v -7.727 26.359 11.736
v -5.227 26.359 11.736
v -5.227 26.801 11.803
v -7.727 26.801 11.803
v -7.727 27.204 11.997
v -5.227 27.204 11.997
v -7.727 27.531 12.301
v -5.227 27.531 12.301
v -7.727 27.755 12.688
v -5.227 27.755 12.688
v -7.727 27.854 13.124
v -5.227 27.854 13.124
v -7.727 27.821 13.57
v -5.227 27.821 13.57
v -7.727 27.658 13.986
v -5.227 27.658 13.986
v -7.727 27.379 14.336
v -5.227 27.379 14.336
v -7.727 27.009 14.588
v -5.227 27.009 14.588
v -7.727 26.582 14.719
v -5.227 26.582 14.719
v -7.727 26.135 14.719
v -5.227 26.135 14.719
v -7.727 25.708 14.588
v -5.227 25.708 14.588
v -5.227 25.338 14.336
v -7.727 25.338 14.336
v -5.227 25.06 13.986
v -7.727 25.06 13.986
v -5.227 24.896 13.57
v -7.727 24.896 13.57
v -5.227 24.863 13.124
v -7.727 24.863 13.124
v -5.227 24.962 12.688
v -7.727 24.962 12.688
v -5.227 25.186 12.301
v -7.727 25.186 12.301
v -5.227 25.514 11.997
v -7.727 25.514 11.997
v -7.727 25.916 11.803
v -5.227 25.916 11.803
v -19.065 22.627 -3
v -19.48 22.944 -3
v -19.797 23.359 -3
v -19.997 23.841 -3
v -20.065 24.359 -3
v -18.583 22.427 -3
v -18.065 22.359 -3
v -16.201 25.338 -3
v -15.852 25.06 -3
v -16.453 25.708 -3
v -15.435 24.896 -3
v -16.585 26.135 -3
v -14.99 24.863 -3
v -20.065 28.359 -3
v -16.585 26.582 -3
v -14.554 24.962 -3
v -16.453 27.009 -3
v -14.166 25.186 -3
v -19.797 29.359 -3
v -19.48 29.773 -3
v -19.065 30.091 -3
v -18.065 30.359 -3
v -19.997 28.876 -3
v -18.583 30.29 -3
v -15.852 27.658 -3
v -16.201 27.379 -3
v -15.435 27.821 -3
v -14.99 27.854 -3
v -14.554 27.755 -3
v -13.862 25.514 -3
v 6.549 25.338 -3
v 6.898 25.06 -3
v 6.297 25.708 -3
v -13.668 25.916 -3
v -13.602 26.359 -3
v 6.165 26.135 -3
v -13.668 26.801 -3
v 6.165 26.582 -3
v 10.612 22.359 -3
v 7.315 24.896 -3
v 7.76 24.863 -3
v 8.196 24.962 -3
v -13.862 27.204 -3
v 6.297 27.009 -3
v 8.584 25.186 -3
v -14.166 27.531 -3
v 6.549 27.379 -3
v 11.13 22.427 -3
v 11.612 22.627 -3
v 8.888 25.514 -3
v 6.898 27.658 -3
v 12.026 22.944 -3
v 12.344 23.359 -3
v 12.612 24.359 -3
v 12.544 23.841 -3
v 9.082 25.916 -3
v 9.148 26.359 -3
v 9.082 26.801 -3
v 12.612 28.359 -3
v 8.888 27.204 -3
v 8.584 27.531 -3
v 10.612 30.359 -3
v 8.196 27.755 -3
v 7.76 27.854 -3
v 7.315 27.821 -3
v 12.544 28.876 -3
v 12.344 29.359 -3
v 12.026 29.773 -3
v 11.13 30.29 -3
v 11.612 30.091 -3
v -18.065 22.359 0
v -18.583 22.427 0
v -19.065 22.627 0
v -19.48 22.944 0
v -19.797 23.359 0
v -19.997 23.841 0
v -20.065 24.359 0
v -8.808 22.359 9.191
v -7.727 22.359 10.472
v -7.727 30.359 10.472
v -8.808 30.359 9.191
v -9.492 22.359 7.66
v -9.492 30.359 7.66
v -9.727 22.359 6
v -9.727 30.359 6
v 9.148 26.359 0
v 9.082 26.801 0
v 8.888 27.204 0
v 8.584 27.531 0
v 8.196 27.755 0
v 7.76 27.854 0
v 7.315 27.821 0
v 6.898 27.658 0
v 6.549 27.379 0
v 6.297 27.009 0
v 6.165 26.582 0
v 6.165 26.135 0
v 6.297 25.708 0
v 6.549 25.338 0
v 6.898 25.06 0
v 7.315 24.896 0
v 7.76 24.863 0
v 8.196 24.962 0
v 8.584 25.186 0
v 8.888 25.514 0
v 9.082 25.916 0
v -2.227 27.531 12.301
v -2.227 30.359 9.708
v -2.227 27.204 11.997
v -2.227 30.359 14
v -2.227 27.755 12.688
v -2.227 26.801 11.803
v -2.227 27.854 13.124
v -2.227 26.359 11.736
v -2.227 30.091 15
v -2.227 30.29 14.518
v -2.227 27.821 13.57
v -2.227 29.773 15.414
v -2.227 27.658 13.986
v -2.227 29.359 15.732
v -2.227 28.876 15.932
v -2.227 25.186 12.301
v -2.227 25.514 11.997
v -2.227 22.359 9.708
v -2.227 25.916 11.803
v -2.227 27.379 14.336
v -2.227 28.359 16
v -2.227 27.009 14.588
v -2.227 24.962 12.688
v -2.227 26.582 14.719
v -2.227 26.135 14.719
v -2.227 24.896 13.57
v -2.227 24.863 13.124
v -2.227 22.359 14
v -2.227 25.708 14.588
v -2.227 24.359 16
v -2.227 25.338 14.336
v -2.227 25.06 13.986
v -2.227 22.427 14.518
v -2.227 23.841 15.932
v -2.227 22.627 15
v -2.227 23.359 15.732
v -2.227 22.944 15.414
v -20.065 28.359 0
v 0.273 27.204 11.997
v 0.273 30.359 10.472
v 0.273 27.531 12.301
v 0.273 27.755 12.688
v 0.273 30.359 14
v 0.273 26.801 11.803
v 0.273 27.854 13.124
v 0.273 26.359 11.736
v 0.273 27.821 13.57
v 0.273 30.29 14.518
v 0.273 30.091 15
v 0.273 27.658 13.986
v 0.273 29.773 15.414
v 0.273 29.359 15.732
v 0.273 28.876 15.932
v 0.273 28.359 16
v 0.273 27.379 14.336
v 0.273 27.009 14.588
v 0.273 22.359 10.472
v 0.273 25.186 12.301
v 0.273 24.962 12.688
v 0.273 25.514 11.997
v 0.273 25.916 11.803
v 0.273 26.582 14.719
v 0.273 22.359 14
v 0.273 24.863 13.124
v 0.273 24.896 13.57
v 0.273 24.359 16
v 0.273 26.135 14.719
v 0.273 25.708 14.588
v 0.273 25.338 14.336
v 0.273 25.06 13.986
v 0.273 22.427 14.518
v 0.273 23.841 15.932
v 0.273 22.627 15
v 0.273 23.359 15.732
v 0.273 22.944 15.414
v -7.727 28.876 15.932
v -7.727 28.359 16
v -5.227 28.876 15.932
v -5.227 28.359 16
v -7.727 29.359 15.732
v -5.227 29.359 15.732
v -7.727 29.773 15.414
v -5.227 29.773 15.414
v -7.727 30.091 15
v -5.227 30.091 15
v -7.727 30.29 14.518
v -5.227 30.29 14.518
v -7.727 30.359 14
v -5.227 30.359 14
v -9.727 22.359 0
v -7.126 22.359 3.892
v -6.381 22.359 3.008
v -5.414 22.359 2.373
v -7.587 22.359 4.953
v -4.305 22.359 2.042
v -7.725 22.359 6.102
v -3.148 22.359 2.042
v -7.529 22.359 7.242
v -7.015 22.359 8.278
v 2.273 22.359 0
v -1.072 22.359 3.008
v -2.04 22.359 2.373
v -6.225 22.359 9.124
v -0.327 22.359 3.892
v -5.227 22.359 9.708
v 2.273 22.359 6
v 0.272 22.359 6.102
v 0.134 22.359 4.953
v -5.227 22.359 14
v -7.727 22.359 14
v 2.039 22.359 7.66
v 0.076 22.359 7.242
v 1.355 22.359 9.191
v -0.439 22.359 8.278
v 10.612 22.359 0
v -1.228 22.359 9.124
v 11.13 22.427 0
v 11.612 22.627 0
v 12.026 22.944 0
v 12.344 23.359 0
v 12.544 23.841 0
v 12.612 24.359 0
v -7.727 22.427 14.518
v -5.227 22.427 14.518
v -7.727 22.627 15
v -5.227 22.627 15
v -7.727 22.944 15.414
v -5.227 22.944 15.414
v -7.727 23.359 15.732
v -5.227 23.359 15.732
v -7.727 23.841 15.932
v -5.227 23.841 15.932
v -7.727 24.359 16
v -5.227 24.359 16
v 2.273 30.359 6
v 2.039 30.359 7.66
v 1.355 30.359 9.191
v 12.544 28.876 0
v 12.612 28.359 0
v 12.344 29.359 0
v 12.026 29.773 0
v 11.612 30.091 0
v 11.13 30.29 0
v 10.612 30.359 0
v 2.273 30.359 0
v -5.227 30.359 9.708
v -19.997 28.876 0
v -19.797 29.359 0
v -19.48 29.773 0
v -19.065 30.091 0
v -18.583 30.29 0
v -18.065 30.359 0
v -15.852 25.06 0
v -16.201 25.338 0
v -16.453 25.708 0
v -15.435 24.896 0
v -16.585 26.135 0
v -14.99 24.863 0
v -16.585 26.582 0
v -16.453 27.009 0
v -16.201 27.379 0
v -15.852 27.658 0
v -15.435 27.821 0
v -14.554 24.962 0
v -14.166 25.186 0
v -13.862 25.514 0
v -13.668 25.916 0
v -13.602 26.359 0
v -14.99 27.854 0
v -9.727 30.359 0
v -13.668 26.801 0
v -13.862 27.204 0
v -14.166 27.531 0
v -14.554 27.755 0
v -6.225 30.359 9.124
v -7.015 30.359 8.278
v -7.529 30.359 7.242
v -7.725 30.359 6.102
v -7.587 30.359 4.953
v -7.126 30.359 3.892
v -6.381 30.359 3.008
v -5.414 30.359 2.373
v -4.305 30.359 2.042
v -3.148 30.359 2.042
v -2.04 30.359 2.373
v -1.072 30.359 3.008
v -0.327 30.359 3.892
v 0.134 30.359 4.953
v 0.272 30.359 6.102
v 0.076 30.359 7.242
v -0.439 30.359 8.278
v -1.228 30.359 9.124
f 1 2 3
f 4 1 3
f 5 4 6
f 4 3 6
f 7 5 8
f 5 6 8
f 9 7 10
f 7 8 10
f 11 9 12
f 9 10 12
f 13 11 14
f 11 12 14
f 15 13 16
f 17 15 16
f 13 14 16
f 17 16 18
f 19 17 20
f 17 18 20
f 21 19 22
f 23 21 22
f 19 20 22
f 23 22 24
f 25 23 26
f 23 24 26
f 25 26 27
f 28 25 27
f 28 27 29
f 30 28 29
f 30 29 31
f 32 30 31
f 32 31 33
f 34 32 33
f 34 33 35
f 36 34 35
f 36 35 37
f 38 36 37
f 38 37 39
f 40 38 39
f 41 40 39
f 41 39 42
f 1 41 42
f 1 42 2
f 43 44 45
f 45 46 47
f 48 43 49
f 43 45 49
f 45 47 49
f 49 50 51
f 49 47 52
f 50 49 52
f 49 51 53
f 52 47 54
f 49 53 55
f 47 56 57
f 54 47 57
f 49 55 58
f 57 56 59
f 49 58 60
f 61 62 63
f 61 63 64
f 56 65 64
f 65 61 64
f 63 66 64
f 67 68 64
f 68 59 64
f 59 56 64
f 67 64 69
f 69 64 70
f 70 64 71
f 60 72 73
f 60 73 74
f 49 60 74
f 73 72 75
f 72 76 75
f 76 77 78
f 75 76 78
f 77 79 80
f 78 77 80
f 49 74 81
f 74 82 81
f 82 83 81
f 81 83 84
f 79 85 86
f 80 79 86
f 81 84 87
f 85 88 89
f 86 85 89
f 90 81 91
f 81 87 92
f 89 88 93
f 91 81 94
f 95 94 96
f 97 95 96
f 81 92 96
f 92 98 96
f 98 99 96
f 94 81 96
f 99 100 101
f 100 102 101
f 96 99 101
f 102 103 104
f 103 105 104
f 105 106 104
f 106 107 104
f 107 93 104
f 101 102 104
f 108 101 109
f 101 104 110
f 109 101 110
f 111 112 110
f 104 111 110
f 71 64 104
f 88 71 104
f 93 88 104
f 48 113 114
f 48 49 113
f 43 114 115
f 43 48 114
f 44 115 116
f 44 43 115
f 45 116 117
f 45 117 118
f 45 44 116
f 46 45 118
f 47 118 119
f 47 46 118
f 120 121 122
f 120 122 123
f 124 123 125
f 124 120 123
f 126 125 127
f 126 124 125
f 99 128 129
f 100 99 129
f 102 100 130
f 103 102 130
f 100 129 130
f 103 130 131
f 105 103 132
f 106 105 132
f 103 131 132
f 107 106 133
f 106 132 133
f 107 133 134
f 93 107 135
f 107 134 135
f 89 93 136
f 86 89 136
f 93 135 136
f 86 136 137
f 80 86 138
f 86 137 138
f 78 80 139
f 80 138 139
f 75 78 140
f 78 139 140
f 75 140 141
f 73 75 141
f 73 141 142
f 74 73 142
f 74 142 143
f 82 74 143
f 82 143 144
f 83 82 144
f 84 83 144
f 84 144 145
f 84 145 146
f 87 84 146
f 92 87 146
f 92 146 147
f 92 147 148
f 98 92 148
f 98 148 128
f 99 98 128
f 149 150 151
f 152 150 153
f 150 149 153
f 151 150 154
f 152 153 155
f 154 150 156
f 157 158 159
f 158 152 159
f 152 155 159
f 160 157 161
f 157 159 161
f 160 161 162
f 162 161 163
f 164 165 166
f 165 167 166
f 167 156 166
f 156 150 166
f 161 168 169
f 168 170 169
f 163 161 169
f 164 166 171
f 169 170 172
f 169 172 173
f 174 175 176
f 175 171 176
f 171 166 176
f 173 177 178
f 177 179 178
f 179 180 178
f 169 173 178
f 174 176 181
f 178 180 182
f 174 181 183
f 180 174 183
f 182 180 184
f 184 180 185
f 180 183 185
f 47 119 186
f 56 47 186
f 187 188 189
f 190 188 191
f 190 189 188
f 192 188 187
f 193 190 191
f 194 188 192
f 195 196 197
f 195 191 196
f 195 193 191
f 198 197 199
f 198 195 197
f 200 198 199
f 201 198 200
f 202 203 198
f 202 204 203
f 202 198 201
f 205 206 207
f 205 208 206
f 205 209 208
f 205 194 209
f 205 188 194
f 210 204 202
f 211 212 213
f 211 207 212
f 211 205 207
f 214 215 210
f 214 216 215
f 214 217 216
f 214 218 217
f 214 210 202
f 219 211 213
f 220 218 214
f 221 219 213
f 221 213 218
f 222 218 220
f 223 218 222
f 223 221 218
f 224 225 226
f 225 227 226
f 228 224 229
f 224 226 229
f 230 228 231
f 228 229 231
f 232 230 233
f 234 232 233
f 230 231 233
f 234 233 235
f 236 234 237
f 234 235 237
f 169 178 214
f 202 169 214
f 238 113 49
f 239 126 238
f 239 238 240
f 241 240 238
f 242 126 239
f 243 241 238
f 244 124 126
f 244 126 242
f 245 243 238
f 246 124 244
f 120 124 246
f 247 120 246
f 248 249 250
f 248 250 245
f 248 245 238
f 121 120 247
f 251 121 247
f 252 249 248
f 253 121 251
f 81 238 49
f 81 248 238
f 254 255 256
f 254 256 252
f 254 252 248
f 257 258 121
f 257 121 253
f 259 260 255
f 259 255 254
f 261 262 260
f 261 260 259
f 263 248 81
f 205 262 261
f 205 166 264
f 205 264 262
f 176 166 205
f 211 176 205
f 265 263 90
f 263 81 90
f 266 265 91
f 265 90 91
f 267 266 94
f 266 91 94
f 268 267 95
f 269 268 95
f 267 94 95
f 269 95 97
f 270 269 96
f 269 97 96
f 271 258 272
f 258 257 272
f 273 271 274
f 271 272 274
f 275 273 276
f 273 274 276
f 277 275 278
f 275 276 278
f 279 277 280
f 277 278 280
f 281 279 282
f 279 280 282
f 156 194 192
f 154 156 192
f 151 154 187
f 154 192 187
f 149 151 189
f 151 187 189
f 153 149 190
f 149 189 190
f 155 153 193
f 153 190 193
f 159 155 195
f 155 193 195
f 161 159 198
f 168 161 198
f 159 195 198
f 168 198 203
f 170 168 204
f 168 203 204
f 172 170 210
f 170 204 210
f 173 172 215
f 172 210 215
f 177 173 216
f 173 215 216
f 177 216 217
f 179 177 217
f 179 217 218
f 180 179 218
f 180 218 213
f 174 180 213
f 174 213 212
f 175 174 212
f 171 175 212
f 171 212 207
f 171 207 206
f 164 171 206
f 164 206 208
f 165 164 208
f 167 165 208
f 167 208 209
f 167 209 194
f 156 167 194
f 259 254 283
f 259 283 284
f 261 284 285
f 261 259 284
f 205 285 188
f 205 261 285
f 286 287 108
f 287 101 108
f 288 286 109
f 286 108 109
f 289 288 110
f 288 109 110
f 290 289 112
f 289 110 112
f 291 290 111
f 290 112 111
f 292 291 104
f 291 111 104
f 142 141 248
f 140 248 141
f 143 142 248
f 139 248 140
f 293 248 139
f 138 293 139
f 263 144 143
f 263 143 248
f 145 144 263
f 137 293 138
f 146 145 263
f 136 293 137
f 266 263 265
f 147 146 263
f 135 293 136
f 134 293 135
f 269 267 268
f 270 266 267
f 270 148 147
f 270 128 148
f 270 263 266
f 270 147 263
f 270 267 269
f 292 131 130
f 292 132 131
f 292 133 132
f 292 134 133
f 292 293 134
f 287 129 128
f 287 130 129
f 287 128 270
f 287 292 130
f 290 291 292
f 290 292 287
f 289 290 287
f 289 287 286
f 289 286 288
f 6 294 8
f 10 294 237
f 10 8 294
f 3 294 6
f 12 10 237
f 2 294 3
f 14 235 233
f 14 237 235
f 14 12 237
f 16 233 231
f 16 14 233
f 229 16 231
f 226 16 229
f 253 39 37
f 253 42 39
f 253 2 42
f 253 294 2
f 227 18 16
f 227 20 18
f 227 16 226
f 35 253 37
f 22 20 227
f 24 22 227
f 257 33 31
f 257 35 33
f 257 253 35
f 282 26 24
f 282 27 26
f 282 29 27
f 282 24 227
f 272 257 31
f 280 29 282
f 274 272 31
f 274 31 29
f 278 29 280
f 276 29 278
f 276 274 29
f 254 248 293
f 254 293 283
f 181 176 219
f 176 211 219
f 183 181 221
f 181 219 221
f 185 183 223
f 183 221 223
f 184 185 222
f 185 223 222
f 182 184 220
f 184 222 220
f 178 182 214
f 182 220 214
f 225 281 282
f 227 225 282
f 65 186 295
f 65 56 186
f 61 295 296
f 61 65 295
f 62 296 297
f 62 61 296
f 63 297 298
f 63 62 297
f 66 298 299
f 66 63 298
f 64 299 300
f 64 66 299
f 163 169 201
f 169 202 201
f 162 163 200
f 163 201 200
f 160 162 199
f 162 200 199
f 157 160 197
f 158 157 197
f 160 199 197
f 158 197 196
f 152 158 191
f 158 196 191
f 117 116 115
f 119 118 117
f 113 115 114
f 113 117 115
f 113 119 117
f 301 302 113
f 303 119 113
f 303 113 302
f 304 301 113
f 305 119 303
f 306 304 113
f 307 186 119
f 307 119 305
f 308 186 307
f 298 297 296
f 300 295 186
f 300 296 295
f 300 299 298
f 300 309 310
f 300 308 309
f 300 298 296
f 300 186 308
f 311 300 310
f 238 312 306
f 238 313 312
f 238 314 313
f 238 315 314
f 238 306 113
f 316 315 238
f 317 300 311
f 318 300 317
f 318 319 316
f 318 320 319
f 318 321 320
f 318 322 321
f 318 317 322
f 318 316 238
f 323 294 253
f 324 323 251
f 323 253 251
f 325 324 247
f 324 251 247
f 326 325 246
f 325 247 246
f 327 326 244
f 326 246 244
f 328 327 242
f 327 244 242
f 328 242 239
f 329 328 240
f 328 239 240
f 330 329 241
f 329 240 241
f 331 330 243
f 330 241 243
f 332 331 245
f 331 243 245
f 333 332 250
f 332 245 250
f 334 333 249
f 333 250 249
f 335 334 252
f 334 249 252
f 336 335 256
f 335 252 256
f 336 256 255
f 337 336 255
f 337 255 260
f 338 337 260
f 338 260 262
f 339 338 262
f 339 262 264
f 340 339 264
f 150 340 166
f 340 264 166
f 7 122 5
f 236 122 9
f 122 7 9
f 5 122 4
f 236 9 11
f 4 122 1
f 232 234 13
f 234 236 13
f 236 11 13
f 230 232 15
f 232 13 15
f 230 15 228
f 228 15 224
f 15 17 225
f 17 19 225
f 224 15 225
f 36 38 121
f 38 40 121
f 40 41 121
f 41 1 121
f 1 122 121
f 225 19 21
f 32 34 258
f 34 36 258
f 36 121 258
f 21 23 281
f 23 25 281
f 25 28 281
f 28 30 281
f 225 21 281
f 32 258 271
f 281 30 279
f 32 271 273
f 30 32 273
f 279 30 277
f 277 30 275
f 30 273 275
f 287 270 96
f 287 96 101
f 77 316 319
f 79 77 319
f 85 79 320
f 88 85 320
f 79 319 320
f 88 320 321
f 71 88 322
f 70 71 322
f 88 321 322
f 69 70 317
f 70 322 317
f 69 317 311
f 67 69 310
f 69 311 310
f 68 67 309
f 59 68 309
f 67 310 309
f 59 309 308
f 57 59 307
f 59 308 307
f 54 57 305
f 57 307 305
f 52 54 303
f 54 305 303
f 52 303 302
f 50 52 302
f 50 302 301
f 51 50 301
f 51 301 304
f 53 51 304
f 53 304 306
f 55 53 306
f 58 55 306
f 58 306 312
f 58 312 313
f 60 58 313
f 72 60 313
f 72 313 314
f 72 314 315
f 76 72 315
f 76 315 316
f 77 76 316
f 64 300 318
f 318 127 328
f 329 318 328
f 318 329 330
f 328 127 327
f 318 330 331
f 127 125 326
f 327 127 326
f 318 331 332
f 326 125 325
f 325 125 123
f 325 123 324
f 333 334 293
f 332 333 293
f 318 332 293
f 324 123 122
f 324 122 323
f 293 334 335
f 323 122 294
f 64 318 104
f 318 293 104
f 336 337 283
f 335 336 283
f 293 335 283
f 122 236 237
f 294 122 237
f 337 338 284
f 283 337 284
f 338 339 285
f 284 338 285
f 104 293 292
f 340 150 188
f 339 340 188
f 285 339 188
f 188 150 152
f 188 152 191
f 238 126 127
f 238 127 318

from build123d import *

# Parameters (mm, degrees)
SKETCH_1_W          = 32.677388302
SKETCH_1_H          = 8
EXTRUDE_1_DEPTH     = 3
SKETCH_2_R          = 1.5
CUT_EXTRUDE_1_DEPTH = 4
SKETCH_3_R          = 6
EXTRUDE_2_DEPTH     = 8
SKETCH_4_R          = 4
CUT_EXTRUDE_2_DEPTH = 9
EXTRUDE_3_DEPTH     = 8
SKETCH_6_W          = 8
SKETCH_6_H          = 6
EXTRUDE_4_DEPTH     = 8
SKETCH_8_W          = 3
SKETCH_8_H          = 10.466633743
CUT_EXTRUDE_5_DEPTH = 9
SKETCH_9_R          = 1.5
CUT_EXTRUDE_6_DEPTH = 21.338694151
FILLET_1_R          = 2
FILLET_2_R          = 2


with BuildPart() as part:
    # 草图1 → 凸台-拉伸1 (new body)
    with BuildSketch(Plane.XY):
        with Locations((-3.726697353, 26.358574689)):
            Rectangle(SKETCH_1_W, SKETCH_1_H)
    extrude(amount=-EXTRUDE_1_DEPTH)

    # 草图2 → 切除-拉伸1 (cut, through all)
    with BuildSketch(Plane.XY):
        with Locations((-15.101697353, 26.358574689)):
            Circle(SKETCH_2_R)
        with Locations((7.648302647, 26.358574689)):
            Circle(SKETCH_2_R)
    extrude(amount=-CUT_EXTRUDE_1_DEPTH, mode=Mode.SUBTRACT)



with BuildPart() as body_2:
    # 草图3 → 凸台-拉伸2 (new body)
    with BuildSketch(Plane.XZ.offset(-22.358574689)):
        with Locations((-3.726697353, 6)):
            Circle(SKETCH_3_R)
    extrude(amount=-EXTRUDE_2_DEPTH)

    # 草图4 → 切除-拉伸2 (cut, through all)
    with BuildSketch(Plane.XZ.offset(-22.358574689)):
        with Locations((-3.726697353, 6)):
            Circle(SKETCH_4_R)
    extrude(amount=-CUT_EXTRUDE_2_DEPTH, mode=Mode.SUBTRACT)


with BuildPart() as part_1:
    add(part.part)

    add(body_2.part)  # 凸台-拉伸3 merges body 2
    # 草图5 → 凸台-拉伸3 (add)
    with BuildSketch(Plane.XZ.offset(-22.358574689)):
        Polygon((-3.726697353, 0), (-9.726697353, 6), (-9.726697353, 0), align=None)
        Polygon((2.273302647, 6), (-3.726697353, 0), (2.273302647, 0), align=None)
    extrude(amount=-EXTRUDE_3_DEPTH)

    # 草图6 → 凸台-拉伸4 (add)
    with BuildSketch(Plane.XZ.offset(-22.358574689)):
        with Locations((-3.726697353, 13)):
            Rectangle(SKETCH_6_W, SKETCH_6_H)
    extrude(amount=-EXTRUDE_4_DEPTH)

    # 草图8 → 切除-拉伸5 (cut, through all)
    with BuildSketch(Plane.XZ.offset(-22.358574689)):
        with Locations((-3.726697353, 11.233316872)):
            Rectangle(SKETCH_8_W, SKETCH_8_H)
    extrude(amount=-CUT_EXTRUDE_5_DEPTH, mode=Mode.SUBTRACT)

    # 草图9 → 切除-拉伸6 (cut, through all)
    with BuildSketch(Plane(origin=(0.273302647, 0, 0), x_dir=(0, 0, -1), z_dir=(1, 0, 0))):
        with Locations((-13.236067977, 26.358574689)):
            Circle(SKETCH_9_R)
    extrude(amount=-CUT_EXTRUDE_6_DEPTH, mode=Mode.SUBTRACT)

    # 圆角1
    fillet_1_edges = [part_1.edges().sort_by_distance(p)[0] for p in [
        (12.611996798, 22.358574689, -1.5),
        (-20.065391504, 22.358574689, -1.5),
        (-20.065391504, 30.358574689, -1.5),
        (12.611996798, 30.358574689, -1.5),
    ]]
    fillet(fillet_1_edges, radius=FILLET_1_R)

    # 圆角2
    fillet_2_edges = [part_1.edges().sort_by_distance(p)[0] for p in [
        (-0.976697353, 22.358574689, 16),
        (-0.976697353, 30.358574689, 16),
        (-6.476697353, 30.358574689, 16),
        (-6.476697353, 22.358574689, 16),
    ]]
    fillet(fillet_2_edges, radius=FILLET_2_R)


solid = part_1.part
